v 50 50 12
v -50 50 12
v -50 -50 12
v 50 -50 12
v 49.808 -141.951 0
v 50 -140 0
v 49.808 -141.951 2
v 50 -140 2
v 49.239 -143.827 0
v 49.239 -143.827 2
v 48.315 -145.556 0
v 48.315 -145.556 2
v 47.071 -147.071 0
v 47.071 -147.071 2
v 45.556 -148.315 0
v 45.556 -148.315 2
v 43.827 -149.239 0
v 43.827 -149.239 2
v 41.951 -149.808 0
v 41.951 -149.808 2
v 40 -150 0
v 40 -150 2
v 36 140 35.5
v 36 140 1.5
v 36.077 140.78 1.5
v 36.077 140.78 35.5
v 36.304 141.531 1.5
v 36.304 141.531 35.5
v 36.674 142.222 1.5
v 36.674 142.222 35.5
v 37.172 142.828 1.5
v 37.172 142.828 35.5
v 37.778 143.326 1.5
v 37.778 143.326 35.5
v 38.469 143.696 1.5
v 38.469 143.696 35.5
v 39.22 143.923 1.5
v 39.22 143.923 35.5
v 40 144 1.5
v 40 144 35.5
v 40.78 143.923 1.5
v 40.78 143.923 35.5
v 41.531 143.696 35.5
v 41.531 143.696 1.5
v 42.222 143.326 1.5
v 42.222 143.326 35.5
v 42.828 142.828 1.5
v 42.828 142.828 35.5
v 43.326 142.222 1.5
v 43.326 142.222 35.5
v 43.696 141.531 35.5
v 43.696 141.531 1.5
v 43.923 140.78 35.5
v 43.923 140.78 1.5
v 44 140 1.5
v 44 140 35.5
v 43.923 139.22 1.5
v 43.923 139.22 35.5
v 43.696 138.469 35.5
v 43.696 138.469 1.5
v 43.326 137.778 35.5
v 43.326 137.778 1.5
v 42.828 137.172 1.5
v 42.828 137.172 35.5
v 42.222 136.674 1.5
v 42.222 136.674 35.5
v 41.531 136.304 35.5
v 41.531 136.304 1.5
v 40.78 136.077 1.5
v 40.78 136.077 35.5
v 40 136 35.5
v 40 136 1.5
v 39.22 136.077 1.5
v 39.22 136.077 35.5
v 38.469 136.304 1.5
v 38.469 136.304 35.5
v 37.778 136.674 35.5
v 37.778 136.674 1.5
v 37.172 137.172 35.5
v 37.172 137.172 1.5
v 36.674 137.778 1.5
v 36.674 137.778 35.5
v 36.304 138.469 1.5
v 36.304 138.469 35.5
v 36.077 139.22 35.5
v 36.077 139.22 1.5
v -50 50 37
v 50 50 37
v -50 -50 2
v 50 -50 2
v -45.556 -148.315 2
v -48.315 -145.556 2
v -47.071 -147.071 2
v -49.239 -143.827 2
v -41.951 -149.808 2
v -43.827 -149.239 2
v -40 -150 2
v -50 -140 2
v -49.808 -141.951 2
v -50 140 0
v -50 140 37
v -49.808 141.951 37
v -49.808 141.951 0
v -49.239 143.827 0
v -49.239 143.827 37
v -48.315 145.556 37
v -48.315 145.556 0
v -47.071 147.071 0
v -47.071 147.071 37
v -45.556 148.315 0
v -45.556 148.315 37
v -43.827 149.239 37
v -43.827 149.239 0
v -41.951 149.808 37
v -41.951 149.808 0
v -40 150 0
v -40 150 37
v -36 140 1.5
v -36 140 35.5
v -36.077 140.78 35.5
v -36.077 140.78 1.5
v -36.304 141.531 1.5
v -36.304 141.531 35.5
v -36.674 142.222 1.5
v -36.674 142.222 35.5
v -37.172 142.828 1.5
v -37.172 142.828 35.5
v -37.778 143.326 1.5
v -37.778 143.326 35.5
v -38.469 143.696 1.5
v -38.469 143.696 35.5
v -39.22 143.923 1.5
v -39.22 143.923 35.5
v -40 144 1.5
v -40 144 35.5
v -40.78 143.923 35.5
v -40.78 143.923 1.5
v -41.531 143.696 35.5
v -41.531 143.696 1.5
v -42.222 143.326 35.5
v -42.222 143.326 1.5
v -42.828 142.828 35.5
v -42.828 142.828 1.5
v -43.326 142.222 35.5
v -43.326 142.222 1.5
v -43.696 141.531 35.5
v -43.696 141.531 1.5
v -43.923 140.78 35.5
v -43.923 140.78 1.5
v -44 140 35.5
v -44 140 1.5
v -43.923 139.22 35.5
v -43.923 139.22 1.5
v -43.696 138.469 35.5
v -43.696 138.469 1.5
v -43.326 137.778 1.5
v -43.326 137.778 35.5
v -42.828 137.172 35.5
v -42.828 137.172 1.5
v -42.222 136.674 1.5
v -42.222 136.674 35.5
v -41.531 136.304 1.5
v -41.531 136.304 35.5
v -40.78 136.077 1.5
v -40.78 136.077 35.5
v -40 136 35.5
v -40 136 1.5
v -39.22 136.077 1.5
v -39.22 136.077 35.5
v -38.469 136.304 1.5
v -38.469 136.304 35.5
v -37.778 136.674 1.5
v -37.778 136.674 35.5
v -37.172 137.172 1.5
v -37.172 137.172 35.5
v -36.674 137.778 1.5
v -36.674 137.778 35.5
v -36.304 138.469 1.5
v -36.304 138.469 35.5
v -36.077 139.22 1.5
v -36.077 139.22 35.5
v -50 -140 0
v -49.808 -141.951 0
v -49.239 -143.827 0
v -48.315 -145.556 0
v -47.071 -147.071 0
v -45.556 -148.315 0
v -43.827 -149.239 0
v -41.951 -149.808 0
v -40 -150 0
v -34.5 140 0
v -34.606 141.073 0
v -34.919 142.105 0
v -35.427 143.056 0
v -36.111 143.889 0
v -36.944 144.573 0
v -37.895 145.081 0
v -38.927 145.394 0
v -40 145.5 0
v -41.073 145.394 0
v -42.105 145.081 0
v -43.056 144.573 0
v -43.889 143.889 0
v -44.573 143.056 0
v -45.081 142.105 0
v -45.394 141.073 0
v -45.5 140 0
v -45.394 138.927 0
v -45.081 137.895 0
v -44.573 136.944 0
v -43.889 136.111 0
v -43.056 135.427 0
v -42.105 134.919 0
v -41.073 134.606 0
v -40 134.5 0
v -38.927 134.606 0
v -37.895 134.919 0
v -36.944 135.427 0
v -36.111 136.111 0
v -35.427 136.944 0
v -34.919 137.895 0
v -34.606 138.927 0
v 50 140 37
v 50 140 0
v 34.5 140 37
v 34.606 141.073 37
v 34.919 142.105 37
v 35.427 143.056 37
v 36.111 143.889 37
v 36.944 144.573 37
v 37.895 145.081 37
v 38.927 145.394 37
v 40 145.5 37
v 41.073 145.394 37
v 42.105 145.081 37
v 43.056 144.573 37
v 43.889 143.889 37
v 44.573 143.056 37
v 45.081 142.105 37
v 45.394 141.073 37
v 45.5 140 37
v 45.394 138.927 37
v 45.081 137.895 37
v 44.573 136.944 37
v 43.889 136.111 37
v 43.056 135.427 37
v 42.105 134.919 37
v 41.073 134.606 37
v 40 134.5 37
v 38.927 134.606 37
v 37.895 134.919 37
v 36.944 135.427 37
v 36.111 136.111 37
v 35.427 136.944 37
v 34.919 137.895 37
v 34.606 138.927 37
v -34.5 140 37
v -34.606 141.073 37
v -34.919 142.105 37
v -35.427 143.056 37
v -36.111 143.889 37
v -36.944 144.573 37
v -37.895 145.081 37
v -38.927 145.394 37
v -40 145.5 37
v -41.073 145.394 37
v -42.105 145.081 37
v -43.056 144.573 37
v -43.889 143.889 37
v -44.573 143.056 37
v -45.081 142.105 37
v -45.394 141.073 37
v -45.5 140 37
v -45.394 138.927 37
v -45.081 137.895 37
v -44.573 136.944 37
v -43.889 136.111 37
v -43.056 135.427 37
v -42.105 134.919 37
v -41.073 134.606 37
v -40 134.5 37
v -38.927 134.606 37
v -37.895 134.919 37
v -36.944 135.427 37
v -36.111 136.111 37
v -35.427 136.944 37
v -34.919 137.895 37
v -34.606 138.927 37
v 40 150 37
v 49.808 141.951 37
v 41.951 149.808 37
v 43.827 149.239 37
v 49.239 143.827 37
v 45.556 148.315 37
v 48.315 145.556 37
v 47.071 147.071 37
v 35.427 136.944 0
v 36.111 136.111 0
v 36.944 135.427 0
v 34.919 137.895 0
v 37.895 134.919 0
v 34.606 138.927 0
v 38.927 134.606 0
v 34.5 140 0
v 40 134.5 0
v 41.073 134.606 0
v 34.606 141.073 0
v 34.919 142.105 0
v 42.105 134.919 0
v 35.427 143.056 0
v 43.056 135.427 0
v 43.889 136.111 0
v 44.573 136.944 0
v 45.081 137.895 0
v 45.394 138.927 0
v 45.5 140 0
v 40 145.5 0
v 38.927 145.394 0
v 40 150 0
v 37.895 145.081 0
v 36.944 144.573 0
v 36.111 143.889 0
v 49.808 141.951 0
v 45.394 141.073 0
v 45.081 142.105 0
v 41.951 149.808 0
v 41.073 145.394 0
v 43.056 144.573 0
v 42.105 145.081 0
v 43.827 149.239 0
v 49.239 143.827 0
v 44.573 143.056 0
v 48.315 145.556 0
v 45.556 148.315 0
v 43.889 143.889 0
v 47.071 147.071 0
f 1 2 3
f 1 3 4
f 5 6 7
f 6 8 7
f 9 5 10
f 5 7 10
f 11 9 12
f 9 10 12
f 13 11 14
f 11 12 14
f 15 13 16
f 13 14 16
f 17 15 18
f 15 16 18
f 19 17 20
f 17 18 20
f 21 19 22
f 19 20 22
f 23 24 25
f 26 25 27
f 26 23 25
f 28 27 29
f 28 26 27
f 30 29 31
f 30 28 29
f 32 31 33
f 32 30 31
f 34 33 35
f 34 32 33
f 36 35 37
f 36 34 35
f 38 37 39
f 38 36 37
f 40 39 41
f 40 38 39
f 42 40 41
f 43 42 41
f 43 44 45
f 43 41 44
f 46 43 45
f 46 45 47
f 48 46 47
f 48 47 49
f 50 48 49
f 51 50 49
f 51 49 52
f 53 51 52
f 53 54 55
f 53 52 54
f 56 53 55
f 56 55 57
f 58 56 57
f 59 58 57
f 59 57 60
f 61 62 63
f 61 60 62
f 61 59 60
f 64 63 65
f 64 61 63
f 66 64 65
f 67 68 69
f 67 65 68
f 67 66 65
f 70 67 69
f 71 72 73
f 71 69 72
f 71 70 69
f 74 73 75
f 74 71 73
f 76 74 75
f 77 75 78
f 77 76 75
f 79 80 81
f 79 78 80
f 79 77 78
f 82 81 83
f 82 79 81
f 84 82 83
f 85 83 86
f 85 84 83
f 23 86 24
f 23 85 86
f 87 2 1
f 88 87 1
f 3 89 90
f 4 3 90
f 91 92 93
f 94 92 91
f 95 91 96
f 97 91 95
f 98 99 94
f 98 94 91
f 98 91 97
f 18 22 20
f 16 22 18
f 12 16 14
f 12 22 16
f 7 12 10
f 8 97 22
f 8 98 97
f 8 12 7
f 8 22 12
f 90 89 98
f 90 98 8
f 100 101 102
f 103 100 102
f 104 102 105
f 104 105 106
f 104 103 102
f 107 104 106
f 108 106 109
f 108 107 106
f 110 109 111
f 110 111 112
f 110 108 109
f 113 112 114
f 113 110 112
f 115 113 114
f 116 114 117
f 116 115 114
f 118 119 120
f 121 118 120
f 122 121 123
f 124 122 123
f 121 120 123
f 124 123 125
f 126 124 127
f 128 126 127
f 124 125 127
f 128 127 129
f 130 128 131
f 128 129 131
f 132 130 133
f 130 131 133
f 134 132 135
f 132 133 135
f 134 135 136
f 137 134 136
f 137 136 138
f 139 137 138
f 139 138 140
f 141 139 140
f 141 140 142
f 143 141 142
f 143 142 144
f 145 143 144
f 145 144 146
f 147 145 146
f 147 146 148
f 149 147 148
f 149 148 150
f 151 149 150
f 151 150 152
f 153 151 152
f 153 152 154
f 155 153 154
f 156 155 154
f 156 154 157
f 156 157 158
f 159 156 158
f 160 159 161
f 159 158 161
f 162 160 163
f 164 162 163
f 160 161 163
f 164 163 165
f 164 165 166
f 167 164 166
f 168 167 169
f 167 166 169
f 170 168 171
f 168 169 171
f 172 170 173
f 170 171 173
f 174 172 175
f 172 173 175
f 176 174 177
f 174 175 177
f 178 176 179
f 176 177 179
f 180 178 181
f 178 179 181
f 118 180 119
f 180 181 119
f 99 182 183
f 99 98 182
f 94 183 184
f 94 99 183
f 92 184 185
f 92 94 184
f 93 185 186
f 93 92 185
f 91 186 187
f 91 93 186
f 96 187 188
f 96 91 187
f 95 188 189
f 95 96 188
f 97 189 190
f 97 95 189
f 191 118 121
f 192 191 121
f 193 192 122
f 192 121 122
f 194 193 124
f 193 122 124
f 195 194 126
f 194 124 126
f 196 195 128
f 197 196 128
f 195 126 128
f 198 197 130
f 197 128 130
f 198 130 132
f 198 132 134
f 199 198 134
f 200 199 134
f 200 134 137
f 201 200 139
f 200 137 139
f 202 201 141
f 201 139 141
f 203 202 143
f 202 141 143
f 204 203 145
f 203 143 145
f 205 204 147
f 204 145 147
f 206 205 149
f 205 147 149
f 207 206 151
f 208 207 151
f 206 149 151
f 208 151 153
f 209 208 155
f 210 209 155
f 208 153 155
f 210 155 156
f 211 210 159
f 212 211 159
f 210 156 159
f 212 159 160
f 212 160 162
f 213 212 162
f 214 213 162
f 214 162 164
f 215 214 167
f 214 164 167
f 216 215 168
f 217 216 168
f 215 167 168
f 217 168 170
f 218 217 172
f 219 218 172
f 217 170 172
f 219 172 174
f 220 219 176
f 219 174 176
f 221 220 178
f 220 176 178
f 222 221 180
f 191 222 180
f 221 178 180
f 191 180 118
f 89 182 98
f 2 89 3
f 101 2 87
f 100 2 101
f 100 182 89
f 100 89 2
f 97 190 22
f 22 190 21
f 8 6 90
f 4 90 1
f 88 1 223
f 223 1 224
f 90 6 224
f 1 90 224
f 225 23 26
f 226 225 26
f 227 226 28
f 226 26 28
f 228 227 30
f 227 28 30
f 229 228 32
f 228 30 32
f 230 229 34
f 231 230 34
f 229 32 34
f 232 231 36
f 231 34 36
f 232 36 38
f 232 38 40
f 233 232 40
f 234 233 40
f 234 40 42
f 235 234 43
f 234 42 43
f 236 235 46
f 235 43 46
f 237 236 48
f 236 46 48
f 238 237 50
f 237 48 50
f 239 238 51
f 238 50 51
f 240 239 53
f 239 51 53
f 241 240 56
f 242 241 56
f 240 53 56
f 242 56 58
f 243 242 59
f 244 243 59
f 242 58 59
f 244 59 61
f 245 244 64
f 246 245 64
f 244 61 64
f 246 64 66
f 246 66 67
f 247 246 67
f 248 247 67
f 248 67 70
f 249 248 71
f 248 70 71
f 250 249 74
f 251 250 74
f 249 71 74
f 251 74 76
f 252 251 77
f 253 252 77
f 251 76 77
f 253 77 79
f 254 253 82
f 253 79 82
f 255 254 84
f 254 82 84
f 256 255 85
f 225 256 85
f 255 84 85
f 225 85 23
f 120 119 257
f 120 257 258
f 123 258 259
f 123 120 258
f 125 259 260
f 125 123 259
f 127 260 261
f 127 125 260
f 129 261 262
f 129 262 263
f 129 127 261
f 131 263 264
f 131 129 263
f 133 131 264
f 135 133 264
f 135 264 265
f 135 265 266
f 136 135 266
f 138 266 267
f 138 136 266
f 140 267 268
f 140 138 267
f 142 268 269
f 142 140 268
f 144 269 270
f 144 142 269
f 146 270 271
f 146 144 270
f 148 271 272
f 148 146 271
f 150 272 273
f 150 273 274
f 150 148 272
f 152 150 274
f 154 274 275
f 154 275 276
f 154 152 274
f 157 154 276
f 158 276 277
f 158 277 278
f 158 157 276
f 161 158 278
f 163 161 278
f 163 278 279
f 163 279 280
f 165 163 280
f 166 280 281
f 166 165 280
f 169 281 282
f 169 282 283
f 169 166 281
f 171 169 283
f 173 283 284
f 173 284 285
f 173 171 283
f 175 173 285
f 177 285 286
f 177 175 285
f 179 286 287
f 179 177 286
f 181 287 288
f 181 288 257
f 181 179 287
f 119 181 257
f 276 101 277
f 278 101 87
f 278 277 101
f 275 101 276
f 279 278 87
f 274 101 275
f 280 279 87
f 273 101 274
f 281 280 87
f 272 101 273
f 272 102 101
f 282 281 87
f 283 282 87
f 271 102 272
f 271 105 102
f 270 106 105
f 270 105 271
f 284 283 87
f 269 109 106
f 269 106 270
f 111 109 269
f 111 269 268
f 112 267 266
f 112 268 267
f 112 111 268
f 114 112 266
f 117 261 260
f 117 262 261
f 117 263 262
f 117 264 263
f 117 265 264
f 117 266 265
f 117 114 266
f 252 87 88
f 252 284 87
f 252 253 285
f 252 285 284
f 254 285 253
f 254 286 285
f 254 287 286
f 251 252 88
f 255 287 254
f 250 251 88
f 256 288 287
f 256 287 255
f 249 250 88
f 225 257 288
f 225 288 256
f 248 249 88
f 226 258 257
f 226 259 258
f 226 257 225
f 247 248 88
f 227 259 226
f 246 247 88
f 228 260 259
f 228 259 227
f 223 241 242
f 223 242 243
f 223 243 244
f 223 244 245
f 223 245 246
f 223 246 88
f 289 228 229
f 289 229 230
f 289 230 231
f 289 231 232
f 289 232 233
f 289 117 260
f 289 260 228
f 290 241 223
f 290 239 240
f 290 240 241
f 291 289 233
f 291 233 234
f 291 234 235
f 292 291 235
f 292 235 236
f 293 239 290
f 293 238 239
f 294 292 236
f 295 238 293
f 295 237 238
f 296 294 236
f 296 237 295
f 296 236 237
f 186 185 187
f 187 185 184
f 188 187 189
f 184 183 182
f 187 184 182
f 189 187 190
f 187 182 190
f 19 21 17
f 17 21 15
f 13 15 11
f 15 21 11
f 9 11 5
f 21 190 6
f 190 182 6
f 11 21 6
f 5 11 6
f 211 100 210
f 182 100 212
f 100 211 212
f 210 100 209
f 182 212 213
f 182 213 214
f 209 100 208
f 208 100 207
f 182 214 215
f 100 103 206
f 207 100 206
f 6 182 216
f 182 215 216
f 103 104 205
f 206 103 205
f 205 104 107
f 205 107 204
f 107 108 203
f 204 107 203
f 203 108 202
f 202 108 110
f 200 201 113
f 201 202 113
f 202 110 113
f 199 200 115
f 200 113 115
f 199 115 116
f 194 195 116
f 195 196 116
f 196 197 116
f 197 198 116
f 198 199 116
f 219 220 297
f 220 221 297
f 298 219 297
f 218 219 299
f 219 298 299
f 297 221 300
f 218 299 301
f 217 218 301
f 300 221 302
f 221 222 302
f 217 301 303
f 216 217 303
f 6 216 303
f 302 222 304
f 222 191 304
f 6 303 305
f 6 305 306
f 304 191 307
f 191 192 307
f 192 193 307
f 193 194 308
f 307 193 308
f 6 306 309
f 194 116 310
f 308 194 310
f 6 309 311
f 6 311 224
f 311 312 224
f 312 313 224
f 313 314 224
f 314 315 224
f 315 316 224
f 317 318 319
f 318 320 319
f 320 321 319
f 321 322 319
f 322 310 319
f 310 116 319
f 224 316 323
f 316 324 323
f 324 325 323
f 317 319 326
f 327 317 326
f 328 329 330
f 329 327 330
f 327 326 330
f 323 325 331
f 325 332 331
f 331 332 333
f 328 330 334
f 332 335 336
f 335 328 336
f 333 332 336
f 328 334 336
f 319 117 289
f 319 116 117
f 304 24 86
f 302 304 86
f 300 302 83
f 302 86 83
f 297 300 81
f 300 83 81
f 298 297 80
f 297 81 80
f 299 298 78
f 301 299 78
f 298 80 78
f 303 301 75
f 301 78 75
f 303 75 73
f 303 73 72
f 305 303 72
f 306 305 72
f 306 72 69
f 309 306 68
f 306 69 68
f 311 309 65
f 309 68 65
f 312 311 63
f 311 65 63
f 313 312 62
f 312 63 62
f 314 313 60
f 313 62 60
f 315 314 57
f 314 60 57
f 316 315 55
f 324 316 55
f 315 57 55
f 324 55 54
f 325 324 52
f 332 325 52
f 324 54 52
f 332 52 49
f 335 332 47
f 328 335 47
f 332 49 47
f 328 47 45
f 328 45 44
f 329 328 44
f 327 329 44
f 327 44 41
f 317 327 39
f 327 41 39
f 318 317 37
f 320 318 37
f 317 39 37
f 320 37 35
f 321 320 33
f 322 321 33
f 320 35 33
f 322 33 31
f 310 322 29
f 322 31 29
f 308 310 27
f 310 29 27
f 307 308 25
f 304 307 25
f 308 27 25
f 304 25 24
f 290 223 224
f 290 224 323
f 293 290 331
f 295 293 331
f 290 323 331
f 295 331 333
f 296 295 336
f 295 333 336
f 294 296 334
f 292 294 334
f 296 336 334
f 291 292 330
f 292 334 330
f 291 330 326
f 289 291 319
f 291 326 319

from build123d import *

# Parameters (mm, degrees)
F0_W     = 100
F0_H     = 300
F1_DEPTH = 2
F2_W     = 100
F2_H     = 200
F3_DEPTH = 10
F4_W     = 100
F4_H     = 100
F5_DEPTH = 25
F6_R     = 10
F7_R     = 4
F8_DEPTH = 37.001
F9_SIZE  = 1.5


# Not quite as in the source:
# - a pattern or mirror of a feature is missing from the dataset's text; its kind, count and spacing are read off the source's solid


with BuildPart() as f1:
    # F0 (on Top) → F1 (new body)
    with BuildSketch(Plane.XY):
        Rectangle(F0_W, F0_H)
    extrude(amount=F1_DEPTH)

    # F2 (on face) → F3 (join)
    with BuildSketch(Plane.XY.offset(2)):
        with Locations((0, 50)):
            Rectangle(F2_W, F2_H)
    extrude(amount=F3_DEPTH)

    # F4 (on face) → F5 (join)
    with BuildSketch(Plane.XY.offset(12)):
        with Locations((0, 100)):
            Rectangle(F4_W, F4_H)
    extrude(amount=F5_DEPTH)

    # F6
    f6_edges = [f1.edges().sort_by_distance(p)[0] for p in [
        (-50, 150, 18.5),
        (-50, -150, 1),
        (50, -150, 1),
        (50, 150, 18.5),
    ]]
    fillet(f6_edges, radius=F6_R)

    # F7 (on face) → F8 (cut, through all)
    with BuildSketch(Plane.XY.offset(37)):
        with Locations((-40, 140)):
            Circle(F7_R)
    f8 = extrude(amount=-F8_DEPTH, mode=Mode.SUBTRACT)

    # F8_copies: F8 across plane
    add(f8.mirror(Plane(origin=(0, 0, 0), x_dir=(0, 0, 1), z_dir=(1, 0, 0))), mode=Mode.SUBTRACT)

    # F9
    f9_edges = [f1.edges().sort_by_distance(p)[0] for p in [
        (-44, 140, 37),
        (-36, 140, 18.5),
        (-44, 140, 0),
        (44, 140, 0),
        (44, 140, 37),
    ]]
    chamfer(f9_edges, length=F9_SIZE)


solid = f1.part
